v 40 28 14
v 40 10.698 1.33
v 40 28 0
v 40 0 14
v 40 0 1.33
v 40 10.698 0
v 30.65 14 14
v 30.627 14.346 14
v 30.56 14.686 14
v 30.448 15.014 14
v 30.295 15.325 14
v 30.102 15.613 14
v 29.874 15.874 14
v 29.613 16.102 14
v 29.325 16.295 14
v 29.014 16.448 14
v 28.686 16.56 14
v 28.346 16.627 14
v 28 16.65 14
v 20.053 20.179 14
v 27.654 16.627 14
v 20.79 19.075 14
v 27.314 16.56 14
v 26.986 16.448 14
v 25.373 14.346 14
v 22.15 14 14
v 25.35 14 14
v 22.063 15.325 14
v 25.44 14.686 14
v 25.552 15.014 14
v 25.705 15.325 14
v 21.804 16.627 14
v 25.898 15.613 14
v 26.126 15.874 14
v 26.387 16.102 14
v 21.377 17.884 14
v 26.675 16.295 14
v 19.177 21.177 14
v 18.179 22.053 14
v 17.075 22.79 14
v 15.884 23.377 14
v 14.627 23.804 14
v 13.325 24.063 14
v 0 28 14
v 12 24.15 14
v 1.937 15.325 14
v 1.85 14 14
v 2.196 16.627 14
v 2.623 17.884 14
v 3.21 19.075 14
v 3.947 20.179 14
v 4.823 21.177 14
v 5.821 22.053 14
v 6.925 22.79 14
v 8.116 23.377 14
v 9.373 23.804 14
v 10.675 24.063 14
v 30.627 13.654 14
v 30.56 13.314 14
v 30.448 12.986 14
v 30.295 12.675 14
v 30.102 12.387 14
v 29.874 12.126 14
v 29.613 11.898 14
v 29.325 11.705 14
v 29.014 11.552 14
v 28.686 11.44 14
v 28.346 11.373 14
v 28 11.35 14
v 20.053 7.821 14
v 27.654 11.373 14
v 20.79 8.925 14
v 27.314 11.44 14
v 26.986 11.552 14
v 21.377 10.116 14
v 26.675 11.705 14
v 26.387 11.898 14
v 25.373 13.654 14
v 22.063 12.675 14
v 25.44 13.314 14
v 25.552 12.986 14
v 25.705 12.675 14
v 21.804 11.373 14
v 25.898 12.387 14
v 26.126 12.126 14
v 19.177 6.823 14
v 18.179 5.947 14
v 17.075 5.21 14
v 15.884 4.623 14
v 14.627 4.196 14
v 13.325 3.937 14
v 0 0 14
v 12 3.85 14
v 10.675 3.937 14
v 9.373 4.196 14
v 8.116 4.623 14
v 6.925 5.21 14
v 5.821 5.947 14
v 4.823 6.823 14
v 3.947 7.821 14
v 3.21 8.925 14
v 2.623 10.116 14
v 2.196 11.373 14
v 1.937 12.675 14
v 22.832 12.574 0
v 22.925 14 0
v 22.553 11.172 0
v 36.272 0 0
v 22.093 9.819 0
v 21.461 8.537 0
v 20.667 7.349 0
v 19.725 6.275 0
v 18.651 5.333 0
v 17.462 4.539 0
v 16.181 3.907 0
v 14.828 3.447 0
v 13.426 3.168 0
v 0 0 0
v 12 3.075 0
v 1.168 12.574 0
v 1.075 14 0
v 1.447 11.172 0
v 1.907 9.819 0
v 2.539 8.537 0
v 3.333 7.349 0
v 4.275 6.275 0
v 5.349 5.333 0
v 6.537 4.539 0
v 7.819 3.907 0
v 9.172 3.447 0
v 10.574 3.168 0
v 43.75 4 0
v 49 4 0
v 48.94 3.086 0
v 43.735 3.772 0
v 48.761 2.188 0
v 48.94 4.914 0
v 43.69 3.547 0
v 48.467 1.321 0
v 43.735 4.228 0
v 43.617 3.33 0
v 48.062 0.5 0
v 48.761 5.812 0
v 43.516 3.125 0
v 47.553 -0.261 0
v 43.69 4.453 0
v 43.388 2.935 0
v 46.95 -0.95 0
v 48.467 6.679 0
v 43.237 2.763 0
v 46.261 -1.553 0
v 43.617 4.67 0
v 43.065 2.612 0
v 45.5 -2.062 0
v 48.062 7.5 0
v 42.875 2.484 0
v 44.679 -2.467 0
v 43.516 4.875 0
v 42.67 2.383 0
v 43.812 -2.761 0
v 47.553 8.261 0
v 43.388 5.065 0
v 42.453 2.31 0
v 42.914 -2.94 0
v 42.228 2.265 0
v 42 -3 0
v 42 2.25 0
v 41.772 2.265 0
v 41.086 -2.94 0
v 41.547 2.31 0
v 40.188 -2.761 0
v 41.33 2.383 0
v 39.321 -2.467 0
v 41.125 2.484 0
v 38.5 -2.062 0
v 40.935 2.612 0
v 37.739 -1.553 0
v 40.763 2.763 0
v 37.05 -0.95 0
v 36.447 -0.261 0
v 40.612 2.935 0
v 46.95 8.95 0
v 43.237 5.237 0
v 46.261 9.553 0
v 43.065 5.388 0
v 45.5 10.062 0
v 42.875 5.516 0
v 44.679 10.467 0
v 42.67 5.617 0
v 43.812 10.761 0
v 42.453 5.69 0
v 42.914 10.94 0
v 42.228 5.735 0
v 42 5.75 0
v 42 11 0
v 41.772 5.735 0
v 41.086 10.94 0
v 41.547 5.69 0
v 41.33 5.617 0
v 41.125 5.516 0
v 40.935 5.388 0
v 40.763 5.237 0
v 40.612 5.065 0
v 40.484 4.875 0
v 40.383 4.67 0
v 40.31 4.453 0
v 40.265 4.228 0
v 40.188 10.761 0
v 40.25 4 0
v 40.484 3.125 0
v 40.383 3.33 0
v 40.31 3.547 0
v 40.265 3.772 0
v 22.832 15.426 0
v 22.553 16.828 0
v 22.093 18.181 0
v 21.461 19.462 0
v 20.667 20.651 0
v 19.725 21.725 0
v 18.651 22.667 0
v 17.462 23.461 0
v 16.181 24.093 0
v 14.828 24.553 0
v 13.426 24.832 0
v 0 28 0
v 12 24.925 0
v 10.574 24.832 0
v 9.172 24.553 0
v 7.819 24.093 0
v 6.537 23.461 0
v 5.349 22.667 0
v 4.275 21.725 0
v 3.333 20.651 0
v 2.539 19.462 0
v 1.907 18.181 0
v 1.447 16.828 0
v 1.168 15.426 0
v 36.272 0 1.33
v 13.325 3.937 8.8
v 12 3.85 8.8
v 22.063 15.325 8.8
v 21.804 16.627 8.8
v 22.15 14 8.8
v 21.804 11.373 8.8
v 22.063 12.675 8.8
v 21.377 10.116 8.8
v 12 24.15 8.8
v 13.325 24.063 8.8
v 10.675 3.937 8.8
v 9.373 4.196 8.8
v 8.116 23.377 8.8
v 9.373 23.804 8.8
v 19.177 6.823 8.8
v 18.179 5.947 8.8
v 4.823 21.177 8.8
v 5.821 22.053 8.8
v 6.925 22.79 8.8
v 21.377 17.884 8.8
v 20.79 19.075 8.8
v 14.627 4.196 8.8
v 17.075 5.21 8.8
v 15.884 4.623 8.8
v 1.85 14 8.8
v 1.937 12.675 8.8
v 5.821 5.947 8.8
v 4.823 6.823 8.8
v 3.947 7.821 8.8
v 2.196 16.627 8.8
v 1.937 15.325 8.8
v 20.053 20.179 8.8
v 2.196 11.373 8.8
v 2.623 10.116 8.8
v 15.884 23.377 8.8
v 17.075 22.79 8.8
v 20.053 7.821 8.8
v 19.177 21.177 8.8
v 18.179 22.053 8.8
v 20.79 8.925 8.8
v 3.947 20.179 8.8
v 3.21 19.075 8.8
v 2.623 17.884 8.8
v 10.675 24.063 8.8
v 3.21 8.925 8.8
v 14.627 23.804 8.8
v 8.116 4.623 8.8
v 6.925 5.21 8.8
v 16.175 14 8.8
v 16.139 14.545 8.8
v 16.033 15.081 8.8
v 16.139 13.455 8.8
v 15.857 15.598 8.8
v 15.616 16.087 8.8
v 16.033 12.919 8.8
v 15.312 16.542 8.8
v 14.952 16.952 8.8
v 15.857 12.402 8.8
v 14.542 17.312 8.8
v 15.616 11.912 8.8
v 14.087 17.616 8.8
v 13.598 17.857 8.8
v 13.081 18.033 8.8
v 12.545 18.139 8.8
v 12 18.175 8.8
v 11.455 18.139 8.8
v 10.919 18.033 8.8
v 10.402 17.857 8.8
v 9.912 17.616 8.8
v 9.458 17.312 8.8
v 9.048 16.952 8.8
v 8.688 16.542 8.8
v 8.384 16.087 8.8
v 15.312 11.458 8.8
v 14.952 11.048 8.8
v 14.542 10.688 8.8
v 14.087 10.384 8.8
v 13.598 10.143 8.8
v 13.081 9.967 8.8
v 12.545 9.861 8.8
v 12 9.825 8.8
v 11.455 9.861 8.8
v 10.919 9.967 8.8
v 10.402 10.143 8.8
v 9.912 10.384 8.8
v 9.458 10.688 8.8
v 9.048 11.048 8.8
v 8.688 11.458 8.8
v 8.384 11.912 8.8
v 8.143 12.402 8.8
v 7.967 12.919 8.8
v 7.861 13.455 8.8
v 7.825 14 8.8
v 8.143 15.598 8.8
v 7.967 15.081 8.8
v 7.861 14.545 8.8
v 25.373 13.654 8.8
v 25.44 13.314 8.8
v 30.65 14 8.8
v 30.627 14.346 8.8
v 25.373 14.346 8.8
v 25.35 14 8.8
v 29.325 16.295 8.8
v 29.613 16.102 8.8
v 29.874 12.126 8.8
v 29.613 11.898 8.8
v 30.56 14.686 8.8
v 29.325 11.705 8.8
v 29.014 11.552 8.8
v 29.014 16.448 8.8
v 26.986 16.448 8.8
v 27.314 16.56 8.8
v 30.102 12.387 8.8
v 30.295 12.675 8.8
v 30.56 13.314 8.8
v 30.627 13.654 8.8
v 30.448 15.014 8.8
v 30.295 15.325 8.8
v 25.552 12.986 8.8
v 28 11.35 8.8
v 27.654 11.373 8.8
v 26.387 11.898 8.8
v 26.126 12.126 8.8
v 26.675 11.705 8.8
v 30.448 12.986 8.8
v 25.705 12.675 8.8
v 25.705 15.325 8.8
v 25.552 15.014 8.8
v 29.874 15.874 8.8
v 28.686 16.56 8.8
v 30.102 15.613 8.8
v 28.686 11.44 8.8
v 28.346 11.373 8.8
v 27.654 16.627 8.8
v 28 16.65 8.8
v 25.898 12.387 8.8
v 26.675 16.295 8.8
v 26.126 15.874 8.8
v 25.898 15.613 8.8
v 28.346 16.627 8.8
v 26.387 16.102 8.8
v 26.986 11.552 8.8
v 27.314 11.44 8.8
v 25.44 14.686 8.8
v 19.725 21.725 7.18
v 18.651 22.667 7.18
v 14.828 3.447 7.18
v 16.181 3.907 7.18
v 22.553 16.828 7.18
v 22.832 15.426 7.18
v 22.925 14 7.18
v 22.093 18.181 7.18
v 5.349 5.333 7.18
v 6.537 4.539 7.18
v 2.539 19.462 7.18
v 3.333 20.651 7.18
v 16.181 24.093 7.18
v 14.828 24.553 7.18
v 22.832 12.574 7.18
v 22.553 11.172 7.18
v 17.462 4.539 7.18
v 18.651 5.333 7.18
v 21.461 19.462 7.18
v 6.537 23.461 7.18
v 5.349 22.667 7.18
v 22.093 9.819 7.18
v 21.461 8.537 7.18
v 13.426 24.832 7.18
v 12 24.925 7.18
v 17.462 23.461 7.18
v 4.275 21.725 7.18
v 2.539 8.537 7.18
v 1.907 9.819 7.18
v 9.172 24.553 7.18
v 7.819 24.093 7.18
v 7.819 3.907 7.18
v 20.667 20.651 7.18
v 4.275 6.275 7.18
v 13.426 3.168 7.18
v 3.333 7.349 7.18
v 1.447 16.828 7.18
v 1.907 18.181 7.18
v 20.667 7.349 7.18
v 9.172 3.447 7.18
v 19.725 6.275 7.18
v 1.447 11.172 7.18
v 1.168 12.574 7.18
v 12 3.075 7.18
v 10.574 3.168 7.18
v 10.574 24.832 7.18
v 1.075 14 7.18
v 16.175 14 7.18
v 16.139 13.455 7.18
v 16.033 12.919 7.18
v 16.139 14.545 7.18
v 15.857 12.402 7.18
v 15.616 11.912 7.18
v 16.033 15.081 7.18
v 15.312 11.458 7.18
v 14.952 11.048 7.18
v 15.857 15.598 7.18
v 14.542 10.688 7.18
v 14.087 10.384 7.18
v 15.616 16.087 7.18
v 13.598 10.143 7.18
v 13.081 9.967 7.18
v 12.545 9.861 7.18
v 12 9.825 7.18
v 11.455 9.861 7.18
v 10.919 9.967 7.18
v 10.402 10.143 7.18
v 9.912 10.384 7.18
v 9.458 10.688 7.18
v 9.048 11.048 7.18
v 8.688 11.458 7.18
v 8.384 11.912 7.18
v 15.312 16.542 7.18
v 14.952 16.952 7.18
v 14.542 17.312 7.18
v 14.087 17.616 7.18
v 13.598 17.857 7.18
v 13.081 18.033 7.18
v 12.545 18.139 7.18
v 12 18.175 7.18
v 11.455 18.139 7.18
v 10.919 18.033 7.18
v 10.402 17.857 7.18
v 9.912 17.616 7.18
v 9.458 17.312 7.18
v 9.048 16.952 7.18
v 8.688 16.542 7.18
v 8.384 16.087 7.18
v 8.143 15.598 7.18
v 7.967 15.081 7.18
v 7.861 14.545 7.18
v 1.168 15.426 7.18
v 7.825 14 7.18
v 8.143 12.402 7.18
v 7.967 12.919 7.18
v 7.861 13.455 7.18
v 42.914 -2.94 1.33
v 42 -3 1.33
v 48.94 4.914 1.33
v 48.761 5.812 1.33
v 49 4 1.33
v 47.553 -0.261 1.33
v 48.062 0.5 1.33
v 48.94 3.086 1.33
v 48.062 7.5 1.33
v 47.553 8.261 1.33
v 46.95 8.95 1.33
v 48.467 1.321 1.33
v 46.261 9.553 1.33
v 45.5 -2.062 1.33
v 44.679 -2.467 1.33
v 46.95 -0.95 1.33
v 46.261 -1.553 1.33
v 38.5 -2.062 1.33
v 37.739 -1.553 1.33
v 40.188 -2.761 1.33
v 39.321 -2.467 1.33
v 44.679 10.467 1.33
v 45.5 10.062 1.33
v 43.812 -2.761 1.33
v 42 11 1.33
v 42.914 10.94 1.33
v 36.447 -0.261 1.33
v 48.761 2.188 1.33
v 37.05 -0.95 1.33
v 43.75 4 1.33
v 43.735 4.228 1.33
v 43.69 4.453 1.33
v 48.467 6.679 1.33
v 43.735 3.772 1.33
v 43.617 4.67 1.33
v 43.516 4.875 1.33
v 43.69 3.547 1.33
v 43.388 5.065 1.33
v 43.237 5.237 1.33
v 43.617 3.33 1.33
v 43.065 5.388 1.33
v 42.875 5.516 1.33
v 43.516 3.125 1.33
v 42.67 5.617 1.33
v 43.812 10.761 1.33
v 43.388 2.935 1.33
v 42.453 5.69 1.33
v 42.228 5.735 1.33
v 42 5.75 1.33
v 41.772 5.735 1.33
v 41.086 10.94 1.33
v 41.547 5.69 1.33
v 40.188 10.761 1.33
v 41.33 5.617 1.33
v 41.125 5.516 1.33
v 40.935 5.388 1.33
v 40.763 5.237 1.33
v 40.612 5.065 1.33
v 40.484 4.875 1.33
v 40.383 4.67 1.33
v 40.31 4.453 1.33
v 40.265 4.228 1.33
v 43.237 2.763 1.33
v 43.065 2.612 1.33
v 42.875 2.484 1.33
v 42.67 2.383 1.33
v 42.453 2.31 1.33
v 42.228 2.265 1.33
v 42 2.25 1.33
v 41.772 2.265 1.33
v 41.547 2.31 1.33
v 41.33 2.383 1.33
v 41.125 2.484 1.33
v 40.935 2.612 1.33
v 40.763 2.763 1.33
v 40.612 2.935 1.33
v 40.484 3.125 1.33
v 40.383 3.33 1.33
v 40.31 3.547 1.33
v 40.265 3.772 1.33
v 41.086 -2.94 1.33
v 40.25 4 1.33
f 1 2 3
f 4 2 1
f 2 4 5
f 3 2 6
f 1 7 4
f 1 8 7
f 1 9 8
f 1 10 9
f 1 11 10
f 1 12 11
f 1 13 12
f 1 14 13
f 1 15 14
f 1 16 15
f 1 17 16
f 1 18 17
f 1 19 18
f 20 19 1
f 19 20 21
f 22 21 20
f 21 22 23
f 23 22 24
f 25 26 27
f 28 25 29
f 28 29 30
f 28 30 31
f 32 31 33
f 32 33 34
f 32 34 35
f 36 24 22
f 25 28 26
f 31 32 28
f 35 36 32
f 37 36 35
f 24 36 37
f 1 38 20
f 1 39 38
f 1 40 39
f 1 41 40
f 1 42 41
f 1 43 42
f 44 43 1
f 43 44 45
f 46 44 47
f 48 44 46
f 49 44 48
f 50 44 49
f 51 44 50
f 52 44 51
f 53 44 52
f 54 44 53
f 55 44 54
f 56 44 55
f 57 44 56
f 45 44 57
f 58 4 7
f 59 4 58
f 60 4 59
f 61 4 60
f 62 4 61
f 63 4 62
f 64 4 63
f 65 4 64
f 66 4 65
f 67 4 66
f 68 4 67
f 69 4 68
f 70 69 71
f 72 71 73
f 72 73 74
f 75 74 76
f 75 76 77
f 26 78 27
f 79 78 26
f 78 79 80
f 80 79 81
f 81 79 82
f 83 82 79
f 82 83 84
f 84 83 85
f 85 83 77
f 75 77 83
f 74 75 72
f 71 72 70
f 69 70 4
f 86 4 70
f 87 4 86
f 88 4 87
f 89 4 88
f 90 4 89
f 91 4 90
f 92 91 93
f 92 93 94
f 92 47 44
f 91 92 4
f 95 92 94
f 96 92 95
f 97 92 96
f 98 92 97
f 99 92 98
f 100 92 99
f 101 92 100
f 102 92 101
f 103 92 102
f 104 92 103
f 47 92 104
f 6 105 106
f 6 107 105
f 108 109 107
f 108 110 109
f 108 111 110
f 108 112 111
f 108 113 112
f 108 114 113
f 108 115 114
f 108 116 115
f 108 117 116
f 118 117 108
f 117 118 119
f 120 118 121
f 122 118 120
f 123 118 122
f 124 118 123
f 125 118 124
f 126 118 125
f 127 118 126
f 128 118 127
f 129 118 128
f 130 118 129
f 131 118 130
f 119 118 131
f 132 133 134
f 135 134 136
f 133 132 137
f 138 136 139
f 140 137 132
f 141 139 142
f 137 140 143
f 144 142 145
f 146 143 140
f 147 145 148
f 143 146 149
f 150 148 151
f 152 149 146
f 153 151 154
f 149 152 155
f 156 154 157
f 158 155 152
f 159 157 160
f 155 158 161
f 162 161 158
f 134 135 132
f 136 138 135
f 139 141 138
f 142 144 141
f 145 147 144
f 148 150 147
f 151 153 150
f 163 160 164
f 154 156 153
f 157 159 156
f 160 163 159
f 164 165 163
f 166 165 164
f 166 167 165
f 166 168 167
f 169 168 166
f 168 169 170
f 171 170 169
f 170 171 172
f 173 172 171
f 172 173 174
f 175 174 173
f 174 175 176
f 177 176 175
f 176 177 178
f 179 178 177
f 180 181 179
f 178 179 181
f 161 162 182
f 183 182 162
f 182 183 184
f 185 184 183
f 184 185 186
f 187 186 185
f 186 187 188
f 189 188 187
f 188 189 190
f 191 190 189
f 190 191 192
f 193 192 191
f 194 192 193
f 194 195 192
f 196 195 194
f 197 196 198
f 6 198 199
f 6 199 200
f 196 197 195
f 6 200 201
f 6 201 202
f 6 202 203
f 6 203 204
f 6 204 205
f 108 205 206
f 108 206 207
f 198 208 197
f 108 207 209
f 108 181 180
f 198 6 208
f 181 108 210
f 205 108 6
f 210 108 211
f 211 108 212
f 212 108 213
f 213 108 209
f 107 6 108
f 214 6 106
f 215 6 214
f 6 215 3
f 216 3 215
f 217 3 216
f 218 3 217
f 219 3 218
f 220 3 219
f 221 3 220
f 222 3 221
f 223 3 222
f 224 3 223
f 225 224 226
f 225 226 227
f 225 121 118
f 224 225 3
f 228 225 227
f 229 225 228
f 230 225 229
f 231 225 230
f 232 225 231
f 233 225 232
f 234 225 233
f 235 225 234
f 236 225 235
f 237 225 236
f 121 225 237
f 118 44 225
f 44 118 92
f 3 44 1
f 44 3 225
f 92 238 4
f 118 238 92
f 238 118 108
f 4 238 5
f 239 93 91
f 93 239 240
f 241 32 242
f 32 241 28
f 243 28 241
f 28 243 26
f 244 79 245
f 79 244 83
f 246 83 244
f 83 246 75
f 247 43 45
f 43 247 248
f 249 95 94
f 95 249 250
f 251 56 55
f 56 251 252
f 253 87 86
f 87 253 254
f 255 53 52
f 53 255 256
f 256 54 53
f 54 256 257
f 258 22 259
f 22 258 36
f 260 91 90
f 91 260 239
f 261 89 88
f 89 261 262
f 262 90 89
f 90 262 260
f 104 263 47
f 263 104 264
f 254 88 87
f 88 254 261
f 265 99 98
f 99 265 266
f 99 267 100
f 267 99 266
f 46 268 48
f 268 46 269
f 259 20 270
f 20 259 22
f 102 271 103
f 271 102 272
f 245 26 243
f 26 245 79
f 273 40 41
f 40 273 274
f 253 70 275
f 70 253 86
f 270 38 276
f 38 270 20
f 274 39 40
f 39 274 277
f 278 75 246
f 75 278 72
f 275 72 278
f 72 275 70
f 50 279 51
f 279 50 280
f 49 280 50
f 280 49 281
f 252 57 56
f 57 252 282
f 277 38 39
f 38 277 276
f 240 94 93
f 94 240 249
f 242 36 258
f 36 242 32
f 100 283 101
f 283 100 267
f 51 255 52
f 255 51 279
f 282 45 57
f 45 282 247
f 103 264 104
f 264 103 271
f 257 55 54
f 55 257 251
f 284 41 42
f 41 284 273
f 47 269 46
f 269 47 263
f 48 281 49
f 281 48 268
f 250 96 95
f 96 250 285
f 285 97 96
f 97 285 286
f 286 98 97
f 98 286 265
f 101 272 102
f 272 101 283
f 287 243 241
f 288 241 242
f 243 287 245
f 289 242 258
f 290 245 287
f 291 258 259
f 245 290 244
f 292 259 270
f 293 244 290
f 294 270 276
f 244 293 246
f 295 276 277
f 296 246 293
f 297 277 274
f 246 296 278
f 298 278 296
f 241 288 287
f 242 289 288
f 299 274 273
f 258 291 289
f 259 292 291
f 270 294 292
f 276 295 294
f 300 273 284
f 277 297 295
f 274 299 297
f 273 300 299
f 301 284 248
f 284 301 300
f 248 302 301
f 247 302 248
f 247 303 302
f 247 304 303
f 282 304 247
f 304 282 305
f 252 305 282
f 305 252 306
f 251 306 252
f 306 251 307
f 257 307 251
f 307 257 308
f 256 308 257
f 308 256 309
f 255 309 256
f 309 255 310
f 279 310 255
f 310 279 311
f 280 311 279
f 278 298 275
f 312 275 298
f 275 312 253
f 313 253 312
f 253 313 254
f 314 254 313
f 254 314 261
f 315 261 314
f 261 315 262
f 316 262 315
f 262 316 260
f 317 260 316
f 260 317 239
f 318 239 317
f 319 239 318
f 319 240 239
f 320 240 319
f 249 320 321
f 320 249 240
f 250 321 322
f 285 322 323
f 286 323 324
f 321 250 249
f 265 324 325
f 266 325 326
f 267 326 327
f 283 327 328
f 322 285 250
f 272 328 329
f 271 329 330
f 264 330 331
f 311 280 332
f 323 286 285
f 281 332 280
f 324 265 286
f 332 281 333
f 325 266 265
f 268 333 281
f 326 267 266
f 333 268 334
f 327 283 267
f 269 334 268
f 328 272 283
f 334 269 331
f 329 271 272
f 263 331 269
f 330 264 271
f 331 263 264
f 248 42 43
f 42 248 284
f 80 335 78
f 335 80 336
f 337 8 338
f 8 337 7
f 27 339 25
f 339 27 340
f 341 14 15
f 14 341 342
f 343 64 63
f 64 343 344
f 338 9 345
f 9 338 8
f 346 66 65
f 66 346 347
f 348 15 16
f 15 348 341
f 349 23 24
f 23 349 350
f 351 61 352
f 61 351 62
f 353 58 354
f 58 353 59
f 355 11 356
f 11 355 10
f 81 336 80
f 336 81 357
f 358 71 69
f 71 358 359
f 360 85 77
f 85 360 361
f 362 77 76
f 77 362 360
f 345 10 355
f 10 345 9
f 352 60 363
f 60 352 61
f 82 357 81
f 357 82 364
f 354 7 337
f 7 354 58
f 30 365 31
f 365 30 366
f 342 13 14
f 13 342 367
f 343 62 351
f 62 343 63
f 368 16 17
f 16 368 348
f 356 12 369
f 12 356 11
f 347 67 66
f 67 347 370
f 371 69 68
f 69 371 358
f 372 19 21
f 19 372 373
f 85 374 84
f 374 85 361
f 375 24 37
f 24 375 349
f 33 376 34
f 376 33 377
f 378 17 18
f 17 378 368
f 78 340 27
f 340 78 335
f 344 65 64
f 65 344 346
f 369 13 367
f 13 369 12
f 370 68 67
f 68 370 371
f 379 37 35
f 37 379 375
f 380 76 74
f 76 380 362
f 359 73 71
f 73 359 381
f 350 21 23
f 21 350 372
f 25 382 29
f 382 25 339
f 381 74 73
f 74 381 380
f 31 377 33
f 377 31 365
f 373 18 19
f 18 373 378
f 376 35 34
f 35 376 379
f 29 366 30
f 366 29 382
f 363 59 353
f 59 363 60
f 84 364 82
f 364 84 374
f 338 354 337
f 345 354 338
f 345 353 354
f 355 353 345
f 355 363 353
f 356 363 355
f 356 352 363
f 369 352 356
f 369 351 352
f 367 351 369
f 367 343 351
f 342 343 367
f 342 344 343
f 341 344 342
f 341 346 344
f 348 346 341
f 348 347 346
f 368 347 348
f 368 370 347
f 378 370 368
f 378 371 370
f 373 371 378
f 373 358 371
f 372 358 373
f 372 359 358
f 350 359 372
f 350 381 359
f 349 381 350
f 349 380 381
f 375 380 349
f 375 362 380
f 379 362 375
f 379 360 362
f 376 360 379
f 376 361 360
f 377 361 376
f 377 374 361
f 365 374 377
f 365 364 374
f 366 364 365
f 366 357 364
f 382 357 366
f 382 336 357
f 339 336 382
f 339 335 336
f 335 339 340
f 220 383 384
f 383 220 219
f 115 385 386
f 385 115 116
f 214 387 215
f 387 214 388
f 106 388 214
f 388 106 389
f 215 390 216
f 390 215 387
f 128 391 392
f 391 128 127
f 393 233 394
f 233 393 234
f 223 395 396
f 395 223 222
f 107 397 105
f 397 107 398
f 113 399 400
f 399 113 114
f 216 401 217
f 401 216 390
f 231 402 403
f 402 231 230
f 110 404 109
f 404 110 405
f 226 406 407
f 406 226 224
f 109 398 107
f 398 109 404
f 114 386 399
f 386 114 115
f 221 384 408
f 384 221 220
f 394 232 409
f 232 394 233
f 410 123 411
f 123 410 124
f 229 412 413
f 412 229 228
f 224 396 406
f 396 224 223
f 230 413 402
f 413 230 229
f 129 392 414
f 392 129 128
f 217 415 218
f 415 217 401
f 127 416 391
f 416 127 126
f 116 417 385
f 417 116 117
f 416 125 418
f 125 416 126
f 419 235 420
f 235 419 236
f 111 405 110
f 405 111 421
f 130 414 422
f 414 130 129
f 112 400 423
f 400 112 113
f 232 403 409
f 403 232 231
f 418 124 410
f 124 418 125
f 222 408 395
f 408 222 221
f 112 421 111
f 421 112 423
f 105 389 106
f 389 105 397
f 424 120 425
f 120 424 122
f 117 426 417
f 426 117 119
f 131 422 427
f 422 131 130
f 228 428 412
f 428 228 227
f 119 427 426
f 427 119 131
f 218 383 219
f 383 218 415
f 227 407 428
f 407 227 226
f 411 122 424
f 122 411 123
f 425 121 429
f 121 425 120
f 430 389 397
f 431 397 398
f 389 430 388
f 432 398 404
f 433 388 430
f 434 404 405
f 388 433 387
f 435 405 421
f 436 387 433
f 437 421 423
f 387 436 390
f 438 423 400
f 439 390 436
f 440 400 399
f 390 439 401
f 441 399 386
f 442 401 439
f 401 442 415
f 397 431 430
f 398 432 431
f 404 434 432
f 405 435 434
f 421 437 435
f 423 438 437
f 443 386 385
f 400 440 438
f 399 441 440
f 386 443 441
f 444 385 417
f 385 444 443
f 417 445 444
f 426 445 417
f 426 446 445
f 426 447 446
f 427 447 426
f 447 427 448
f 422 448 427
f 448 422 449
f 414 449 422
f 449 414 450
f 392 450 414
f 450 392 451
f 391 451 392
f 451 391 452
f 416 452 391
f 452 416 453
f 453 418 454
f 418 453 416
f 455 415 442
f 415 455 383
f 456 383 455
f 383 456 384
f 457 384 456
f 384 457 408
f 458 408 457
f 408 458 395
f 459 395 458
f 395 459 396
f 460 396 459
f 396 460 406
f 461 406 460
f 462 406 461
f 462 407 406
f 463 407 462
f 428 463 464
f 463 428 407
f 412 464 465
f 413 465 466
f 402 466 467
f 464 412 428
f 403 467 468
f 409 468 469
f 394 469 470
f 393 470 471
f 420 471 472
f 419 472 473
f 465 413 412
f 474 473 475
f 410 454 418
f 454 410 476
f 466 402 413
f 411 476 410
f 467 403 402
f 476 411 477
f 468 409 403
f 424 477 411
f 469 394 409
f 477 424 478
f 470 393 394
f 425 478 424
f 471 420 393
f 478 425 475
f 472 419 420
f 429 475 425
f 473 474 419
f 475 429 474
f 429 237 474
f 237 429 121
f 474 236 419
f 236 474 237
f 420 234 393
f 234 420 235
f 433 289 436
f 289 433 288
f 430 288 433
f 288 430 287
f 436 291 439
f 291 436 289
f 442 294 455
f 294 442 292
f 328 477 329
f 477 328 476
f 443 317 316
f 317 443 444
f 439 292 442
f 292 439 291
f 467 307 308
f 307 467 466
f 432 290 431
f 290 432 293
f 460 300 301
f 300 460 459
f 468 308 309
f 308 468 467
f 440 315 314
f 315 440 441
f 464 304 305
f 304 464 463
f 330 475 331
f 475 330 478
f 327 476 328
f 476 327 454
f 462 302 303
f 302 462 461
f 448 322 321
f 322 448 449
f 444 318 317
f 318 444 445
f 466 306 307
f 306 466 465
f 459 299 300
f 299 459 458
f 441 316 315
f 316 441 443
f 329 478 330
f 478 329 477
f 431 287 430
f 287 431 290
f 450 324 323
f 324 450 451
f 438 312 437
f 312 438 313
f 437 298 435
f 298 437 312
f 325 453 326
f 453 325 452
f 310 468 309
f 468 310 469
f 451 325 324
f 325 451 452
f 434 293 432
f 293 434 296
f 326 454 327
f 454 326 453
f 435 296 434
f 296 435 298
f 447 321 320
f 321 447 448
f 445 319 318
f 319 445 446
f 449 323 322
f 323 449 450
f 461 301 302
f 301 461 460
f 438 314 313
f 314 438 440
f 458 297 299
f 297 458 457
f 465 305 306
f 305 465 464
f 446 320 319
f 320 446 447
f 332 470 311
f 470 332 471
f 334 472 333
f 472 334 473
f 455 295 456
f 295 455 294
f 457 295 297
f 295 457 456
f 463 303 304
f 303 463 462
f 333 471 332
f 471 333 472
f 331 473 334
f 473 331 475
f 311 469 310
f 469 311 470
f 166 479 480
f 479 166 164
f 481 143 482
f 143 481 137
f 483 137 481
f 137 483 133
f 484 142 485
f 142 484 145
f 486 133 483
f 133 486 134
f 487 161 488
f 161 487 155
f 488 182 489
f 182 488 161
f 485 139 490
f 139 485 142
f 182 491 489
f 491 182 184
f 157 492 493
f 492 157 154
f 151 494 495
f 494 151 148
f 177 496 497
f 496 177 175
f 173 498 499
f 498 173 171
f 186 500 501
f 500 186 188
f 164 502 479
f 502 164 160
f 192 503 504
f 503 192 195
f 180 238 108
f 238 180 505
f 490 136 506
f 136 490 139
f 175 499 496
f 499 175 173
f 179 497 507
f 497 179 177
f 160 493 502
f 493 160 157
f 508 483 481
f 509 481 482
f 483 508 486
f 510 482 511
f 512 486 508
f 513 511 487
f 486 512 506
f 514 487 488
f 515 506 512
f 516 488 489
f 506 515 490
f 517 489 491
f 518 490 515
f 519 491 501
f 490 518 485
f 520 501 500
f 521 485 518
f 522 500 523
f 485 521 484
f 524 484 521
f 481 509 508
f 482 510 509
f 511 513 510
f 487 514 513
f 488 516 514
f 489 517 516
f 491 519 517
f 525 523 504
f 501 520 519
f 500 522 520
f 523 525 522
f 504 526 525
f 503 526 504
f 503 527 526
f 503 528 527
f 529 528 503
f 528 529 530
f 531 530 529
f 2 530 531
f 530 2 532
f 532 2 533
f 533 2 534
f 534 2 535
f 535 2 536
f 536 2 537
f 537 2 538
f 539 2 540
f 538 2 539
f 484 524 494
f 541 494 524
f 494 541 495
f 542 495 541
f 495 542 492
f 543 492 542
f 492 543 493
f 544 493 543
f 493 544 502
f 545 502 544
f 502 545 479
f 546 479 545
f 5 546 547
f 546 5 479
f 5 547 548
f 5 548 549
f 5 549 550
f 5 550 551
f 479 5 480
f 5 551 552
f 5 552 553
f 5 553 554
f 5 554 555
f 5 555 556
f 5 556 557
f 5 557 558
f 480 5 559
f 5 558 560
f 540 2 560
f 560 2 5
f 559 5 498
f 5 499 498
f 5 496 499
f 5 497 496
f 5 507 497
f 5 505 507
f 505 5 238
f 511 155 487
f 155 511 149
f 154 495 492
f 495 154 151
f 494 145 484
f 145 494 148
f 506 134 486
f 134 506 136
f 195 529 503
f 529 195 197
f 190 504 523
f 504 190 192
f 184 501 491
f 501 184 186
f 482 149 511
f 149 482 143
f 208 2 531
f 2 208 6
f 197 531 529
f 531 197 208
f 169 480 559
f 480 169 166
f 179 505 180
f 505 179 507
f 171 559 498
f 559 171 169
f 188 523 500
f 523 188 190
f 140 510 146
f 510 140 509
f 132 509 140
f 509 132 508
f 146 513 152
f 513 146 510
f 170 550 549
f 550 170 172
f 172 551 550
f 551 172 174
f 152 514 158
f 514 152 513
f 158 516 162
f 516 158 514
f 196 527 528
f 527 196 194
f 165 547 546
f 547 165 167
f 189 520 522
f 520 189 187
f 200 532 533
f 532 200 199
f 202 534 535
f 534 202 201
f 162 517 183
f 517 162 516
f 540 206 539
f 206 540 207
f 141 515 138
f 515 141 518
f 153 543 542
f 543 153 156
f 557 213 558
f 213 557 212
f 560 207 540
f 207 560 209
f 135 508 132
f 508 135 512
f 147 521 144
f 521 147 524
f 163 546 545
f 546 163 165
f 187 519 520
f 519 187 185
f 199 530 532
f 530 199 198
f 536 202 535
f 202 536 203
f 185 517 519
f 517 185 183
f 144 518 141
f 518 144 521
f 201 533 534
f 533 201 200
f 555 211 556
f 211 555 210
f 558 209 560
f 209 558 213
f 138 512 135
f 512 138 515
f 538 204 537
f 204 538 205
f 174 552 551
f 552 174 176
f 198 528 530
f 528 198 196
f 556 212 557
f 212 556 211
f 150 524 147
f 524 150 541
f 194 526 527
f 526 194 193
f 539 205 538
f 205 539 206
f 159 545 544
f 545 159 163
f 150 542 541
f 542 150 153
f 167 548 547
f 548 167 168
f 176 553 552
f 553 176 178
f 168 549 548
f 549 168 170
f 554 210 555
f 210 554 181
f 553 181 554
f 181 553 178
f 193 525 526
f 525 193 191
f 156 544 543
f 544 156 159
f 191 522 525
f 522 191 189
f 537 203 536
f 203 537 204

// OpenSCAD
// file: parameters.scad
// =============================================================================
// Gen-AA Vernier flux-claw dual nano-gap — WOUND-AWARE (HARD GATE)
// Improve Gen-X: tighter m2m ≤6.4, more copper (145 t), run_clear 0.70
// =============================================================================

wire_awg            = 26;
wire_od             = 0.45;
turns               = 145;      // +10 vs Gen-X 135
fill                = 0.70;
layers_per_face     = 2;
wind_build_axial    = layers_per_face * wire_od * fill;   // 0.63
wind_build_radial   = 3 * wire_od * fill;                 // 0.945

coil_id_r           = 21.5;
coil_od_r           = 58.0;
span_deg            = 25.0;     // 12 stations; vernier vs 16-pole equiv
former_web          = 2.0;
flange_t            = 0.75;
wall                = 1.2;
slot_w              = 2.4;
mount_hole          = 3.5;
tab_len             = 7.0;

former_bare_h       = former_web + 2 * flange_t;            // 3.5
coil_envelope_h     = former_bare_h + 2 * wind_build_axial; // 4.76

run_clear           = 0.70;
gap_spacer_h        = run_clear + wind_build_axial;         // 1.33
m2m                 = coil_envelope_h + 2 * run_clear;      // 6.16 (beats Gen-X 6.76; ≤6.4 target)

coil_stations       = 12;
bay_r_in            = coil_id_r - 2.0 - wind_build_radial;
bay_r_out           = coil_od_r + 2.0 + wind_build_radial;
bay_span            = span_deg + 4.0;
bay_offset          = 2.0;
stator_thick        = former_bare_h;
stator_od           = 156.0;
shaft_clear_stator  = 36.0;
coil_mount_r        = 28.0;

// Dual rotors: 8+8 Ø20 vernier poles + 24+24 Ø5 flux claws / edge assists
large_pocket_d      = 20.3;
small_pocket_d      = 5.3;
pocket_h            = 5.2;
large_n             = 8;
R_large             = 50.0;
R_small_inner       = 36.0;     // claw inner
R_small_mid         = 50.0;
R_small_outer       = 64.0;
carrier_od          = 152.0;
carrier_thick       = 7.5;
hub_h               = 10.0;
hub_od              = 30.0;
rotor_b_offset_deg  = 22.5;     // vernier offset

shaft_bore          = 8.35;
bearing_d           = 21.85;
bearing_h           = 7.2;
m3_clear            = 3.5;
bolt_r_inner        = 36.0;
bolt_n_inner        = 6;
flange_bolt_r       = 72.0;
flange_bolt_n       = 6;
brace_r             = 68.0;
brace_d             = 4.3;
brace_n             = 4;

spacer_pad_od       = 14.0;
spacer_pad_id       = m3_clear;
endbell_od          = 156.0;
endbell_thick       = 8.0;
endbell_shaft_clear = 10.0;

$fn = 64;
// main file
// Gen-AA fit coupon — magnet pockets + 608 + spacer height
include <parameters.scad>;
$fn = 48;
block_w = 40; block_d = 28; block_h = 14;
difference() {
    cube([block_w, block_d, block_h]);
    translate([12, block_d/2, block_h - pocket_h])
        cylinder(d=large_pocket_d, h=pocket_h + 0.2);
    translate([28, block_d/2, block_h - pocket_h])
        cylinder(d=small_pocket_d, h=pocket_h + 0.2);
    translate([12, block_d/2, -0.02])
        cylinder(d=bearing_d, h=bearing_h);
    translate([12, block_d/2, -0.1])
        cylinder(d=shaft_bore, h=block_h + 1);
}
translate([block_w + 2, 4, 0])
    difference() {
        cylinder(d=spacer_pad_od, h=gap_spacer_h);
        translate([0, 0, -0.1]) cylinder(d=spacer_pad_id, h=gap_spacer_h + 0.2);
    }
